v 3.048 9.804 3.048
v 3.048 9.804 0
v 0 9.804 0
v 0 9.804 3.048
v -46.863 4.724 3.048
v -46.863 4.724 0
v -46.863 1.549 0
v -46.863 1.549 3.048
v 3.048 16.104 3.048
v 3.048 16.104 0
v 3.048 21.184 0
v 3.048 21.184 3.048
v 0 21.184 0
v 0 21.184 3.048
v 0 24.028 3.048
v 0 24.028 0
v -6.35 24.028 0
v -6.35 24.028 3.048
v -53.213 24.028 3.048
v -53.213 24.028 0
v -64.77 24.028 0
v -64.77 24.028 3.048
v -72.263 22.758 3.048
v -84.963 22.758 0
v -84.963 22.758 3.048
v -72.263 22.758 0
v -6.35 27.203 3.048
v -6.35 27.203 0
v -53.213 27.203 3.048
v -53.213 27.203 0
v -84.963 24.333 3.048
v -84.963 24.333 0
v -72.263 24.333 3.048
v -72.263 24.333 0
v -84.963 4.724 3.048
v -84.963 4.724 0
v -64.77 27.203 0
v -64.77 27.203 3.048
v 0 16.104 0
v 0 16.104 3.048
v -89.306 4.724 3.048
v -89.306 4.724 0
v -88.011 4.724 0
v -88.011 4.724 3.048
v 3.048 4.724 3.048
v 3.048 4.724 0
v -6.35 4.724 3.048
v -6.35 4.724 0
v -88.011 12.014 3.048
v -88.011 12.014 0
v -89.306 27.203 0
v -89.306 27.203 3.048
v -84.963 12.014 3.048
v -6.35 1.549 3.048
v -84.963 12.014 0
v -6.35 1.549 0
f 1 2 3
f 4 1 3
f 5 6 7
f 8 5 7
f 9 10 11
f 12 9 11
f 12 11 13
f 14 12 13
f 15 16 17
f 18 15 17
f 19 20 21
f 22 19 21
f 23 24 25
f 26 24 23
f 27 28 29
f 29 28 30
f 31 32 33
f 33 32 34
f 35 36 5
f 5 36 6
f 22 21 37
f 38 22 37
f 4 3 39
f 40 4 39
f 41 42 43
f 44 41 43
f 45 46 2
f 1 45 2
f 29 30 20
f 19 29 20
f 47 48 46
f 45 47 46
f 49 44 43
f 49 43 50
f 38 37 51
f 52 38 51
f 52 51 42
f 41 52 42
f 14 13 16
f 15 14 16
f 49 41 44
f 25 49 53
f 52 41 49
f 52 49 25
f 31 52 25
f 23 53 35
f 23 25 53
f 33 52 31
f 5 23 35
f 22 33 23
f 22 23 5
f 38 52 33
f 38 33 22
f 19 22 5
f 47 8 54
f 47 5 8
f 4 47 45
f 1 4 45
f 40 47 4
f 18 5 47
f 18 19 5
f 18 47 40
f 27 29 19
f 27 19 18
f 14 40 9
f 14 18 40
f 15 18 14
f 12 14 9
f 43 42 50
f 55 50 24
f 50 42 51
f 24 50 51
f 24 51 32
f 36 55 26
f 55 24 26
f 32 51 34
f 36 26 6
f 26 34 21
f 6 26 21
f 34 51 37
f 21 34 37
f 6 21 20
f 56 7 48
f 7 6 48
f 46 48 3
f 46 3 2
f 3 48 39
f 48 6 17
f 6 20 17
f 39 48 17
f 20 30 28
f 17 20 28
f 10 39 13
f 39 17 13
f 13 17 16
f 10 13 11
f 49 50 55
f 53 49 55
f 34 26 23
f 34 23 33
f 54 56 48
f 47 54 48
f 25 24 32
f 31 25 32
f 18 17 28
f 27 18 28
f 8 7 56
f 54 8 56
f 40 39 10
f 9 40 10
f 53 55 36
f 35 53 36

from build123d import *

# Parameters (mm, degrees)
SKETCH1_W           = 12.7
SKETCH1_H           = 1.5748
BOSS_EXTRUDE1_DEPTH = 3.048
SKETCH2_W           = 12.7
SKETCH2_H           = 0.1016
BOSS_EXTRUDE2_DEPTH = 3.048
SKETCH3_W           = 3.048
SKETCH3_H           = 7.2898
CUT_EXTRUDE1_DEPTH  = 4.048


with BuildPart() as part:
    # Sketch1 → Boss-Extrude1 (new body)
    with BuildSketch(Plane.XY):
        Polygon((-6.35, 1.5494), (-6.35, 4.7244), (3.048, 4.7244), (3.048, 9.8044), (0, 9.8044), (0, 16.1036), (3.048, 16.1036), (3.048, 21.1836), (0, 21.1836), (0, 24.0284), (-6.35, 24.0284), (-6.35, 27.2034), (-53.213, 27.2034), (-53.213, 24.0284), (-64.77, 24.0284), (-64.77, 27.2034), (-89.3064, 27.2034), (-89.3064, 15.9639), (-89.3064, 4.7244), (-86.7664, 4.7244), (-86.7664, 12.0142), (-84.963, 12.0142), (-84.963, 4.7244), (-46.863, 4.7244), (-46.863, 1.5494), align=None)
        with Locations((-78.613, 23.5458)):
            Rectangle(SKETCH1_W, SKETCH1_H, mode=Mode.SUBTRACT)
    extrude(amount=BOSS_EXTRUDE1_DEPTH)

    # Sketch2 → Boss-Extrude2 (add)
    with BuildSketch(Plane.XY.offset(3.048)):
        with Locations((-78.613, 24.384)):
            Rectangle(SKETCH2_W, SKETCH2_H)
    extrude(amount=-BOSS_EXTRUDE2_DEPTH)

    # Sketch3 → Cut-Extrude1 (cut, through all)
    with BuildSketch(Plane.XY.offset(3.048)):
        with Locations((-86.487, 8.3693)):
            Rectangle(SKETCH3_W, SKETCH3_H)
    extrude(amount=-CUT_EXTRUDE1_DEPTH, mode=Mode.SUBTRACT)


solid = part.part
